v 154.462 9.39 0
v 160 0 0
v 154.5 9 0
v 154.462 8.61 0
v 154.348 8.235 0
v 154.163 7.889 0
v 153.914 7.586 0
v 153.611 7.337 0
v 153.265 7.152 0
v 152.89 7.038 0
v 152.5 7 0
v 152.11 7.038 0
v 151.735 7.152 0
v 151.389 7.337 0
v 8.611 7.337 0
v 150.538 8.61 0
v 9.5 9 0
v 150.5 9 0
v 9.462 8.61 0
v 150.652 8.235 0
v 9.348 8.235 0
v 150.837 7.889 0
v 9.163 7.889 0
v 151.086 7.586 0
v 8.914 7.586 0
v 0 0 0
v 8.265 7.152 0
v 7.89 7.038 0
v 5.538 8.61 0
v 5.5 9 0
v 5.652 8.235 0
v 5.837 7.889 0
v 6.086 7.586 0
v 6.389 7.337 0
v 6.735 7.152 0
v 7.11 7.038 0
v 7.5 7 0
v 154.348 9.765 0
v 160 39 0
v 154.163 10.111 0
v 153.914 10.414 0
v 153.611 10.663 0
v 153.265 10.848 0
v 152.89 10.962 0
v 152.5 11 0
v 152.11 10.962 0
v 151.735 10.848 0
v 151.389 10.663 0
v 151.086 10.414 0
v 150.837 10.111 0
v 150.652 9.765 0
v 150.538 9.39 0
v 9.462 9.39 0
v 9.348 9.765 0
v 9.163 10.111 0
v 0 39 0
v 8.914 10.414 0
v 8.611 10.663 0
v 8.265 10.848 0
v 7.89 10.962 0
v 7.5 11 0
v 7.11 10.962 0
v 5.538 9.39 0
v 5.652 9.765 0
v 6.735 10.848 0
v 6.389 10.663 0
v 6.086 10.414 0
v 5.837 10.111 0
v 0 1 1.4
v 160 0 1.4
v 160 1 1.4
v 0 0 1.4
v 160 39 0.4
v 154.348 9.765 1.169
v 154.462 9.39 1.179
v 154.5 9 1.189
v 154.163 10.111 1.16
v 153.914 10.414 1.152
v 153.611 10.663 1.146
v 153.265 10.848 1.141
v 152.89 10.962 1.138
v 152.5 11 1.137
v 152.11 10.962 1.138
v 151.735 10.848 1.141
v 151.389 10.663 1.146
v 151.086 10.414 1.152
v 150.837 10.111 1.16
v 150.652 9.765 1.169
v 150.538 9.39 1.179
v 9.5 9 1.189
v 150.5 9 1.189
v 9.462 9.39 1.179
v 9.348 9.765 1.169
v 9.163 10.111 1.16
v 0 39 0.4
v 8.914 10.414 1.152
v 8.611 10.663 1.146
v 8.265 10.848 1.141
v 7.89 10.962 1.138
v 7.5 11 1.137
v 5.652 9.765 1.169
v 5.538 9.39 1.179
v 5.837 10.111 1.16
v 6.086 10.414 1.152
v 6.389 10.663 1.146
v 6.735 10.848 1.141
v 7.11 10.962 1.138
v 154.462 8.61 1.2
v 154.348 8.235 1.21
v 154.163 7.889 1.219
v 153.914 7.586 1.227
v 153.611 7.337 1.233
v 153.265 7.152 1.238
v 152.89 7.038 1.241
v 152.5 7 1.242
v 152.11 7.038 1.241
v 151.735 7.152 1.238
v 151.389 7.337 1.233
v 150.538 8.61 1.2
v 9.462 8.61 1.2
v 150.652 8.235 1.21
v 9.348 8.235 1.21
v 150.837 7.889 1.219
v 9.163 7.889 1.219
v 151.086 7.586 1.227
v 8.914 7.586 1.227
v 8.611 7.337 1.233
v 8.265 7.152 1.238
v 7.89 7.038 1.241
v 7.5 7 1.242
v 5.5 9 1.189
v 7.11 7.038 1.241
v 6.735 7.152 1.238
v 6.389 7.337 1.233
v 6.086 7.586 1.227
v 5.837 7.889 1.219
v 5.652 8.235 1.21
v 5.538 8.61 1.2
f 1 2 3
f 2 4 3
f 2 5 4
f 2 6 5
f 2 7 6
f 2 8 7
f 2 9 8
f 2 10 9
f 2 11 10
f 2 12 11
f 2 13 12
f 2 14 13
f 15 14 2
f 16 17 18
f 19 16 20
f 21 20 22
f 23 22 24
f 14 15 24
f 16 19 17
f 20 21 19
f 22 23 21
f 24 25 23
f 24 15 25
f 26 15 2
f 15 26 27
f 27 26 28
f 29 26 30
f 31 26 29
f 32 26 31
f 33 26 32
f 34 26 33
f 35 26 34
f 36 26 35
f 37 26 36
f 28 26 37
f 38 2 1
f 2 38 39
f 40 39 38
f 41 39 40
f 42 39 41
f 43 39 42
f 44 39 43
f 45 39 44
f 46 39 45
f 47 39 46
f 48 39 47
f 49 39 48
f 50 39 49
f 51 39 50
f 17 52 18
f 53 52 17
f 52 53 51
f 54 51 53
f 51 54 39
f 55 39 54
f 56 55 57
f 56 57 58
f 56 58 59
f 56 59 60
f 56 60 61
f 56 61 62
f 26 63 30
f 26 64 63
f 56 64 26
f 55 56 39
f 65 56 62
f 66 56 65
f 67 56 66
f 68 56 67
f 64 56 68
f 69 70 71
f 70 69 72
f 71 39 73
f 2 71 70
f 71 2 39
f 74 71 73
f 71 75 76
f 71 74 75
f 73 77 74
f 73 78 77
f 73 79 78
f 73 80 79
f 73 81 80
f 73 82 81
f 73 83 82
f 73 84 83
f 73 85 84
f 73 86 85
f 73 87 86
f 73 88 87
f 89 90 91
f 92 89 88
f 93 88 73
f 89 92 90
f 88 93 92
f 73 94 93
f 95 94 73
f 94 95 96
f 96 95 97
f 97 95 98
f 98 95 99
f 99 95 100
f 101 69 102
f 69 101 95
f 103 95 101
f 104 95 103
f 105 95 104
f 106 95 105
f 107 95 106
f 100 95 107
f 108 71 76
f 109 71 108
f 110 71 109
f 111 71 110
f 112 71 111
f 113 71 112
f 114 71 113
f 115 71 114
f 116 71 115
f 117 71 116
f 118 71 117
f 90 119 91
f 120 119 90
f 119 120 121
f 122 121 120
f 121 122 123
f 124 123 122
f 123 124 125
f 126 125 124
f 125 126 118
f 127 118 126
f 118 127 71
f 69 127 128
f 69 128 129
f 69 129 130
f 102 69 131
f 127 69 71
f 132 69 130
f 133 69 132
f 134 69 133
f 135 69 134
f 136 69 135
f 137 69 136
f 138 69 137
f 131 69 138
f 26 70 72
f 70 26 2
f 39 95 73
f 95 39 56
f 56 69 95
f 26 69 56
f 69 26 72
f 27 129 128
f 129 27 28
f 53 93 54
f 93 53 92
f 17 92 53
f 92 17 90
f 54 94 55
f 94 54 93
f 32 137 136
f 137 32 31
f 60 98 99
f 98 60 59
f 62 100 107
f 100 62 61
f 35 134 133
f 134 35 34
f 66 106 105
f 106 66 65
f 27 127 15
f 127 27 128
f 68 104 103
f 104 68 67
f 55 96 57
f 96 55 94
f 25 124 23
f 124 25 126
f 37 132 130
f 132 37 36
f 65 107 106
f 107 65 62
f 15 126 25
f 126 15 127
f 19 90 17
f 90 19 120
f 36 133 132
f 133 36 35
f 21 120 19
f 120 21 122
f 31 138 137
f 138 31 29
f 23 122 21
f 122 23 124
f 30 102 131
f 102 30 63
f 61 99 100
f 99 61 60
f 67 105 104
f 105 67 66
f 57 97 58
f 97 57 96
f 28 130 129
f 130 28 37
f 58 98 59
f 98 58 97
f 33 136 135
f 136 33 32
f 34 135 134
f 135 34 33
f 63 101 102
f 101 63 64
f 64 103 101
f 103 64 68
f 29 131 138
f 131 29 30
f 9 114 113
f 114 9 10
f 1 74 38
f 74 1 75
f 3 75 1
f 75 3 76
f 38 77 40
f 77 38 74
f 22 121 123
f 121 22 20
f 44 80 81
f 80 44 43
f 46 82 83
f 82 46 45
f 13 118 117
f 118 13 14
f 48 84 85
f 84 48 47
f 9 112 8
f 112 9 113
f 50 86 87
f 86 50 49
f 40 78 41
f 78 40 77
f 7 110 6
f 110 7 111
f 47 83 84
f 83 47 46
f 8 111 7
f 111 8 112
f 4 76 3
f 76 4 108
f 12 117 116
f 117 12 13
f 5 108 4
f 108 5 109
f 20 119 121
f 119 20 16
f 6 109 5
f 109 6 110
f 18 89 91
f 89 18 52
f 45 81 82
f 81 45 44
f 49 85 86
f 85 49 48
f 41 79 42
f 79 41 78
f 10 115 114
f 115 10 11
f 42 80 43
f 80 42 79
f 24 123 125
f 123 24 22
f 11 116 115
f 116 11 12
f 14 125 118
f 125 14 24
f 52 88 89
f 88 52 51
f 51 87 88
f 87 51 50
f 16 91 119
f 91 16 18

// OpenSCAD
$fn = 32;

dlzka = 160;
sirka = 38;
posun = (160 - 145) / 2;

difference() {
    hull() {
        cube([dlzka, 1, 1.4]);
        translate([0, sirka, 0]) cube([dlzka, 1, 0.4]);
    }
    translate([posun, 9, 0]) cylinder(h = 10, d = 4);
    translate([145+posun, 9, 0]) cylinder(h = 10, d = 4);
}
